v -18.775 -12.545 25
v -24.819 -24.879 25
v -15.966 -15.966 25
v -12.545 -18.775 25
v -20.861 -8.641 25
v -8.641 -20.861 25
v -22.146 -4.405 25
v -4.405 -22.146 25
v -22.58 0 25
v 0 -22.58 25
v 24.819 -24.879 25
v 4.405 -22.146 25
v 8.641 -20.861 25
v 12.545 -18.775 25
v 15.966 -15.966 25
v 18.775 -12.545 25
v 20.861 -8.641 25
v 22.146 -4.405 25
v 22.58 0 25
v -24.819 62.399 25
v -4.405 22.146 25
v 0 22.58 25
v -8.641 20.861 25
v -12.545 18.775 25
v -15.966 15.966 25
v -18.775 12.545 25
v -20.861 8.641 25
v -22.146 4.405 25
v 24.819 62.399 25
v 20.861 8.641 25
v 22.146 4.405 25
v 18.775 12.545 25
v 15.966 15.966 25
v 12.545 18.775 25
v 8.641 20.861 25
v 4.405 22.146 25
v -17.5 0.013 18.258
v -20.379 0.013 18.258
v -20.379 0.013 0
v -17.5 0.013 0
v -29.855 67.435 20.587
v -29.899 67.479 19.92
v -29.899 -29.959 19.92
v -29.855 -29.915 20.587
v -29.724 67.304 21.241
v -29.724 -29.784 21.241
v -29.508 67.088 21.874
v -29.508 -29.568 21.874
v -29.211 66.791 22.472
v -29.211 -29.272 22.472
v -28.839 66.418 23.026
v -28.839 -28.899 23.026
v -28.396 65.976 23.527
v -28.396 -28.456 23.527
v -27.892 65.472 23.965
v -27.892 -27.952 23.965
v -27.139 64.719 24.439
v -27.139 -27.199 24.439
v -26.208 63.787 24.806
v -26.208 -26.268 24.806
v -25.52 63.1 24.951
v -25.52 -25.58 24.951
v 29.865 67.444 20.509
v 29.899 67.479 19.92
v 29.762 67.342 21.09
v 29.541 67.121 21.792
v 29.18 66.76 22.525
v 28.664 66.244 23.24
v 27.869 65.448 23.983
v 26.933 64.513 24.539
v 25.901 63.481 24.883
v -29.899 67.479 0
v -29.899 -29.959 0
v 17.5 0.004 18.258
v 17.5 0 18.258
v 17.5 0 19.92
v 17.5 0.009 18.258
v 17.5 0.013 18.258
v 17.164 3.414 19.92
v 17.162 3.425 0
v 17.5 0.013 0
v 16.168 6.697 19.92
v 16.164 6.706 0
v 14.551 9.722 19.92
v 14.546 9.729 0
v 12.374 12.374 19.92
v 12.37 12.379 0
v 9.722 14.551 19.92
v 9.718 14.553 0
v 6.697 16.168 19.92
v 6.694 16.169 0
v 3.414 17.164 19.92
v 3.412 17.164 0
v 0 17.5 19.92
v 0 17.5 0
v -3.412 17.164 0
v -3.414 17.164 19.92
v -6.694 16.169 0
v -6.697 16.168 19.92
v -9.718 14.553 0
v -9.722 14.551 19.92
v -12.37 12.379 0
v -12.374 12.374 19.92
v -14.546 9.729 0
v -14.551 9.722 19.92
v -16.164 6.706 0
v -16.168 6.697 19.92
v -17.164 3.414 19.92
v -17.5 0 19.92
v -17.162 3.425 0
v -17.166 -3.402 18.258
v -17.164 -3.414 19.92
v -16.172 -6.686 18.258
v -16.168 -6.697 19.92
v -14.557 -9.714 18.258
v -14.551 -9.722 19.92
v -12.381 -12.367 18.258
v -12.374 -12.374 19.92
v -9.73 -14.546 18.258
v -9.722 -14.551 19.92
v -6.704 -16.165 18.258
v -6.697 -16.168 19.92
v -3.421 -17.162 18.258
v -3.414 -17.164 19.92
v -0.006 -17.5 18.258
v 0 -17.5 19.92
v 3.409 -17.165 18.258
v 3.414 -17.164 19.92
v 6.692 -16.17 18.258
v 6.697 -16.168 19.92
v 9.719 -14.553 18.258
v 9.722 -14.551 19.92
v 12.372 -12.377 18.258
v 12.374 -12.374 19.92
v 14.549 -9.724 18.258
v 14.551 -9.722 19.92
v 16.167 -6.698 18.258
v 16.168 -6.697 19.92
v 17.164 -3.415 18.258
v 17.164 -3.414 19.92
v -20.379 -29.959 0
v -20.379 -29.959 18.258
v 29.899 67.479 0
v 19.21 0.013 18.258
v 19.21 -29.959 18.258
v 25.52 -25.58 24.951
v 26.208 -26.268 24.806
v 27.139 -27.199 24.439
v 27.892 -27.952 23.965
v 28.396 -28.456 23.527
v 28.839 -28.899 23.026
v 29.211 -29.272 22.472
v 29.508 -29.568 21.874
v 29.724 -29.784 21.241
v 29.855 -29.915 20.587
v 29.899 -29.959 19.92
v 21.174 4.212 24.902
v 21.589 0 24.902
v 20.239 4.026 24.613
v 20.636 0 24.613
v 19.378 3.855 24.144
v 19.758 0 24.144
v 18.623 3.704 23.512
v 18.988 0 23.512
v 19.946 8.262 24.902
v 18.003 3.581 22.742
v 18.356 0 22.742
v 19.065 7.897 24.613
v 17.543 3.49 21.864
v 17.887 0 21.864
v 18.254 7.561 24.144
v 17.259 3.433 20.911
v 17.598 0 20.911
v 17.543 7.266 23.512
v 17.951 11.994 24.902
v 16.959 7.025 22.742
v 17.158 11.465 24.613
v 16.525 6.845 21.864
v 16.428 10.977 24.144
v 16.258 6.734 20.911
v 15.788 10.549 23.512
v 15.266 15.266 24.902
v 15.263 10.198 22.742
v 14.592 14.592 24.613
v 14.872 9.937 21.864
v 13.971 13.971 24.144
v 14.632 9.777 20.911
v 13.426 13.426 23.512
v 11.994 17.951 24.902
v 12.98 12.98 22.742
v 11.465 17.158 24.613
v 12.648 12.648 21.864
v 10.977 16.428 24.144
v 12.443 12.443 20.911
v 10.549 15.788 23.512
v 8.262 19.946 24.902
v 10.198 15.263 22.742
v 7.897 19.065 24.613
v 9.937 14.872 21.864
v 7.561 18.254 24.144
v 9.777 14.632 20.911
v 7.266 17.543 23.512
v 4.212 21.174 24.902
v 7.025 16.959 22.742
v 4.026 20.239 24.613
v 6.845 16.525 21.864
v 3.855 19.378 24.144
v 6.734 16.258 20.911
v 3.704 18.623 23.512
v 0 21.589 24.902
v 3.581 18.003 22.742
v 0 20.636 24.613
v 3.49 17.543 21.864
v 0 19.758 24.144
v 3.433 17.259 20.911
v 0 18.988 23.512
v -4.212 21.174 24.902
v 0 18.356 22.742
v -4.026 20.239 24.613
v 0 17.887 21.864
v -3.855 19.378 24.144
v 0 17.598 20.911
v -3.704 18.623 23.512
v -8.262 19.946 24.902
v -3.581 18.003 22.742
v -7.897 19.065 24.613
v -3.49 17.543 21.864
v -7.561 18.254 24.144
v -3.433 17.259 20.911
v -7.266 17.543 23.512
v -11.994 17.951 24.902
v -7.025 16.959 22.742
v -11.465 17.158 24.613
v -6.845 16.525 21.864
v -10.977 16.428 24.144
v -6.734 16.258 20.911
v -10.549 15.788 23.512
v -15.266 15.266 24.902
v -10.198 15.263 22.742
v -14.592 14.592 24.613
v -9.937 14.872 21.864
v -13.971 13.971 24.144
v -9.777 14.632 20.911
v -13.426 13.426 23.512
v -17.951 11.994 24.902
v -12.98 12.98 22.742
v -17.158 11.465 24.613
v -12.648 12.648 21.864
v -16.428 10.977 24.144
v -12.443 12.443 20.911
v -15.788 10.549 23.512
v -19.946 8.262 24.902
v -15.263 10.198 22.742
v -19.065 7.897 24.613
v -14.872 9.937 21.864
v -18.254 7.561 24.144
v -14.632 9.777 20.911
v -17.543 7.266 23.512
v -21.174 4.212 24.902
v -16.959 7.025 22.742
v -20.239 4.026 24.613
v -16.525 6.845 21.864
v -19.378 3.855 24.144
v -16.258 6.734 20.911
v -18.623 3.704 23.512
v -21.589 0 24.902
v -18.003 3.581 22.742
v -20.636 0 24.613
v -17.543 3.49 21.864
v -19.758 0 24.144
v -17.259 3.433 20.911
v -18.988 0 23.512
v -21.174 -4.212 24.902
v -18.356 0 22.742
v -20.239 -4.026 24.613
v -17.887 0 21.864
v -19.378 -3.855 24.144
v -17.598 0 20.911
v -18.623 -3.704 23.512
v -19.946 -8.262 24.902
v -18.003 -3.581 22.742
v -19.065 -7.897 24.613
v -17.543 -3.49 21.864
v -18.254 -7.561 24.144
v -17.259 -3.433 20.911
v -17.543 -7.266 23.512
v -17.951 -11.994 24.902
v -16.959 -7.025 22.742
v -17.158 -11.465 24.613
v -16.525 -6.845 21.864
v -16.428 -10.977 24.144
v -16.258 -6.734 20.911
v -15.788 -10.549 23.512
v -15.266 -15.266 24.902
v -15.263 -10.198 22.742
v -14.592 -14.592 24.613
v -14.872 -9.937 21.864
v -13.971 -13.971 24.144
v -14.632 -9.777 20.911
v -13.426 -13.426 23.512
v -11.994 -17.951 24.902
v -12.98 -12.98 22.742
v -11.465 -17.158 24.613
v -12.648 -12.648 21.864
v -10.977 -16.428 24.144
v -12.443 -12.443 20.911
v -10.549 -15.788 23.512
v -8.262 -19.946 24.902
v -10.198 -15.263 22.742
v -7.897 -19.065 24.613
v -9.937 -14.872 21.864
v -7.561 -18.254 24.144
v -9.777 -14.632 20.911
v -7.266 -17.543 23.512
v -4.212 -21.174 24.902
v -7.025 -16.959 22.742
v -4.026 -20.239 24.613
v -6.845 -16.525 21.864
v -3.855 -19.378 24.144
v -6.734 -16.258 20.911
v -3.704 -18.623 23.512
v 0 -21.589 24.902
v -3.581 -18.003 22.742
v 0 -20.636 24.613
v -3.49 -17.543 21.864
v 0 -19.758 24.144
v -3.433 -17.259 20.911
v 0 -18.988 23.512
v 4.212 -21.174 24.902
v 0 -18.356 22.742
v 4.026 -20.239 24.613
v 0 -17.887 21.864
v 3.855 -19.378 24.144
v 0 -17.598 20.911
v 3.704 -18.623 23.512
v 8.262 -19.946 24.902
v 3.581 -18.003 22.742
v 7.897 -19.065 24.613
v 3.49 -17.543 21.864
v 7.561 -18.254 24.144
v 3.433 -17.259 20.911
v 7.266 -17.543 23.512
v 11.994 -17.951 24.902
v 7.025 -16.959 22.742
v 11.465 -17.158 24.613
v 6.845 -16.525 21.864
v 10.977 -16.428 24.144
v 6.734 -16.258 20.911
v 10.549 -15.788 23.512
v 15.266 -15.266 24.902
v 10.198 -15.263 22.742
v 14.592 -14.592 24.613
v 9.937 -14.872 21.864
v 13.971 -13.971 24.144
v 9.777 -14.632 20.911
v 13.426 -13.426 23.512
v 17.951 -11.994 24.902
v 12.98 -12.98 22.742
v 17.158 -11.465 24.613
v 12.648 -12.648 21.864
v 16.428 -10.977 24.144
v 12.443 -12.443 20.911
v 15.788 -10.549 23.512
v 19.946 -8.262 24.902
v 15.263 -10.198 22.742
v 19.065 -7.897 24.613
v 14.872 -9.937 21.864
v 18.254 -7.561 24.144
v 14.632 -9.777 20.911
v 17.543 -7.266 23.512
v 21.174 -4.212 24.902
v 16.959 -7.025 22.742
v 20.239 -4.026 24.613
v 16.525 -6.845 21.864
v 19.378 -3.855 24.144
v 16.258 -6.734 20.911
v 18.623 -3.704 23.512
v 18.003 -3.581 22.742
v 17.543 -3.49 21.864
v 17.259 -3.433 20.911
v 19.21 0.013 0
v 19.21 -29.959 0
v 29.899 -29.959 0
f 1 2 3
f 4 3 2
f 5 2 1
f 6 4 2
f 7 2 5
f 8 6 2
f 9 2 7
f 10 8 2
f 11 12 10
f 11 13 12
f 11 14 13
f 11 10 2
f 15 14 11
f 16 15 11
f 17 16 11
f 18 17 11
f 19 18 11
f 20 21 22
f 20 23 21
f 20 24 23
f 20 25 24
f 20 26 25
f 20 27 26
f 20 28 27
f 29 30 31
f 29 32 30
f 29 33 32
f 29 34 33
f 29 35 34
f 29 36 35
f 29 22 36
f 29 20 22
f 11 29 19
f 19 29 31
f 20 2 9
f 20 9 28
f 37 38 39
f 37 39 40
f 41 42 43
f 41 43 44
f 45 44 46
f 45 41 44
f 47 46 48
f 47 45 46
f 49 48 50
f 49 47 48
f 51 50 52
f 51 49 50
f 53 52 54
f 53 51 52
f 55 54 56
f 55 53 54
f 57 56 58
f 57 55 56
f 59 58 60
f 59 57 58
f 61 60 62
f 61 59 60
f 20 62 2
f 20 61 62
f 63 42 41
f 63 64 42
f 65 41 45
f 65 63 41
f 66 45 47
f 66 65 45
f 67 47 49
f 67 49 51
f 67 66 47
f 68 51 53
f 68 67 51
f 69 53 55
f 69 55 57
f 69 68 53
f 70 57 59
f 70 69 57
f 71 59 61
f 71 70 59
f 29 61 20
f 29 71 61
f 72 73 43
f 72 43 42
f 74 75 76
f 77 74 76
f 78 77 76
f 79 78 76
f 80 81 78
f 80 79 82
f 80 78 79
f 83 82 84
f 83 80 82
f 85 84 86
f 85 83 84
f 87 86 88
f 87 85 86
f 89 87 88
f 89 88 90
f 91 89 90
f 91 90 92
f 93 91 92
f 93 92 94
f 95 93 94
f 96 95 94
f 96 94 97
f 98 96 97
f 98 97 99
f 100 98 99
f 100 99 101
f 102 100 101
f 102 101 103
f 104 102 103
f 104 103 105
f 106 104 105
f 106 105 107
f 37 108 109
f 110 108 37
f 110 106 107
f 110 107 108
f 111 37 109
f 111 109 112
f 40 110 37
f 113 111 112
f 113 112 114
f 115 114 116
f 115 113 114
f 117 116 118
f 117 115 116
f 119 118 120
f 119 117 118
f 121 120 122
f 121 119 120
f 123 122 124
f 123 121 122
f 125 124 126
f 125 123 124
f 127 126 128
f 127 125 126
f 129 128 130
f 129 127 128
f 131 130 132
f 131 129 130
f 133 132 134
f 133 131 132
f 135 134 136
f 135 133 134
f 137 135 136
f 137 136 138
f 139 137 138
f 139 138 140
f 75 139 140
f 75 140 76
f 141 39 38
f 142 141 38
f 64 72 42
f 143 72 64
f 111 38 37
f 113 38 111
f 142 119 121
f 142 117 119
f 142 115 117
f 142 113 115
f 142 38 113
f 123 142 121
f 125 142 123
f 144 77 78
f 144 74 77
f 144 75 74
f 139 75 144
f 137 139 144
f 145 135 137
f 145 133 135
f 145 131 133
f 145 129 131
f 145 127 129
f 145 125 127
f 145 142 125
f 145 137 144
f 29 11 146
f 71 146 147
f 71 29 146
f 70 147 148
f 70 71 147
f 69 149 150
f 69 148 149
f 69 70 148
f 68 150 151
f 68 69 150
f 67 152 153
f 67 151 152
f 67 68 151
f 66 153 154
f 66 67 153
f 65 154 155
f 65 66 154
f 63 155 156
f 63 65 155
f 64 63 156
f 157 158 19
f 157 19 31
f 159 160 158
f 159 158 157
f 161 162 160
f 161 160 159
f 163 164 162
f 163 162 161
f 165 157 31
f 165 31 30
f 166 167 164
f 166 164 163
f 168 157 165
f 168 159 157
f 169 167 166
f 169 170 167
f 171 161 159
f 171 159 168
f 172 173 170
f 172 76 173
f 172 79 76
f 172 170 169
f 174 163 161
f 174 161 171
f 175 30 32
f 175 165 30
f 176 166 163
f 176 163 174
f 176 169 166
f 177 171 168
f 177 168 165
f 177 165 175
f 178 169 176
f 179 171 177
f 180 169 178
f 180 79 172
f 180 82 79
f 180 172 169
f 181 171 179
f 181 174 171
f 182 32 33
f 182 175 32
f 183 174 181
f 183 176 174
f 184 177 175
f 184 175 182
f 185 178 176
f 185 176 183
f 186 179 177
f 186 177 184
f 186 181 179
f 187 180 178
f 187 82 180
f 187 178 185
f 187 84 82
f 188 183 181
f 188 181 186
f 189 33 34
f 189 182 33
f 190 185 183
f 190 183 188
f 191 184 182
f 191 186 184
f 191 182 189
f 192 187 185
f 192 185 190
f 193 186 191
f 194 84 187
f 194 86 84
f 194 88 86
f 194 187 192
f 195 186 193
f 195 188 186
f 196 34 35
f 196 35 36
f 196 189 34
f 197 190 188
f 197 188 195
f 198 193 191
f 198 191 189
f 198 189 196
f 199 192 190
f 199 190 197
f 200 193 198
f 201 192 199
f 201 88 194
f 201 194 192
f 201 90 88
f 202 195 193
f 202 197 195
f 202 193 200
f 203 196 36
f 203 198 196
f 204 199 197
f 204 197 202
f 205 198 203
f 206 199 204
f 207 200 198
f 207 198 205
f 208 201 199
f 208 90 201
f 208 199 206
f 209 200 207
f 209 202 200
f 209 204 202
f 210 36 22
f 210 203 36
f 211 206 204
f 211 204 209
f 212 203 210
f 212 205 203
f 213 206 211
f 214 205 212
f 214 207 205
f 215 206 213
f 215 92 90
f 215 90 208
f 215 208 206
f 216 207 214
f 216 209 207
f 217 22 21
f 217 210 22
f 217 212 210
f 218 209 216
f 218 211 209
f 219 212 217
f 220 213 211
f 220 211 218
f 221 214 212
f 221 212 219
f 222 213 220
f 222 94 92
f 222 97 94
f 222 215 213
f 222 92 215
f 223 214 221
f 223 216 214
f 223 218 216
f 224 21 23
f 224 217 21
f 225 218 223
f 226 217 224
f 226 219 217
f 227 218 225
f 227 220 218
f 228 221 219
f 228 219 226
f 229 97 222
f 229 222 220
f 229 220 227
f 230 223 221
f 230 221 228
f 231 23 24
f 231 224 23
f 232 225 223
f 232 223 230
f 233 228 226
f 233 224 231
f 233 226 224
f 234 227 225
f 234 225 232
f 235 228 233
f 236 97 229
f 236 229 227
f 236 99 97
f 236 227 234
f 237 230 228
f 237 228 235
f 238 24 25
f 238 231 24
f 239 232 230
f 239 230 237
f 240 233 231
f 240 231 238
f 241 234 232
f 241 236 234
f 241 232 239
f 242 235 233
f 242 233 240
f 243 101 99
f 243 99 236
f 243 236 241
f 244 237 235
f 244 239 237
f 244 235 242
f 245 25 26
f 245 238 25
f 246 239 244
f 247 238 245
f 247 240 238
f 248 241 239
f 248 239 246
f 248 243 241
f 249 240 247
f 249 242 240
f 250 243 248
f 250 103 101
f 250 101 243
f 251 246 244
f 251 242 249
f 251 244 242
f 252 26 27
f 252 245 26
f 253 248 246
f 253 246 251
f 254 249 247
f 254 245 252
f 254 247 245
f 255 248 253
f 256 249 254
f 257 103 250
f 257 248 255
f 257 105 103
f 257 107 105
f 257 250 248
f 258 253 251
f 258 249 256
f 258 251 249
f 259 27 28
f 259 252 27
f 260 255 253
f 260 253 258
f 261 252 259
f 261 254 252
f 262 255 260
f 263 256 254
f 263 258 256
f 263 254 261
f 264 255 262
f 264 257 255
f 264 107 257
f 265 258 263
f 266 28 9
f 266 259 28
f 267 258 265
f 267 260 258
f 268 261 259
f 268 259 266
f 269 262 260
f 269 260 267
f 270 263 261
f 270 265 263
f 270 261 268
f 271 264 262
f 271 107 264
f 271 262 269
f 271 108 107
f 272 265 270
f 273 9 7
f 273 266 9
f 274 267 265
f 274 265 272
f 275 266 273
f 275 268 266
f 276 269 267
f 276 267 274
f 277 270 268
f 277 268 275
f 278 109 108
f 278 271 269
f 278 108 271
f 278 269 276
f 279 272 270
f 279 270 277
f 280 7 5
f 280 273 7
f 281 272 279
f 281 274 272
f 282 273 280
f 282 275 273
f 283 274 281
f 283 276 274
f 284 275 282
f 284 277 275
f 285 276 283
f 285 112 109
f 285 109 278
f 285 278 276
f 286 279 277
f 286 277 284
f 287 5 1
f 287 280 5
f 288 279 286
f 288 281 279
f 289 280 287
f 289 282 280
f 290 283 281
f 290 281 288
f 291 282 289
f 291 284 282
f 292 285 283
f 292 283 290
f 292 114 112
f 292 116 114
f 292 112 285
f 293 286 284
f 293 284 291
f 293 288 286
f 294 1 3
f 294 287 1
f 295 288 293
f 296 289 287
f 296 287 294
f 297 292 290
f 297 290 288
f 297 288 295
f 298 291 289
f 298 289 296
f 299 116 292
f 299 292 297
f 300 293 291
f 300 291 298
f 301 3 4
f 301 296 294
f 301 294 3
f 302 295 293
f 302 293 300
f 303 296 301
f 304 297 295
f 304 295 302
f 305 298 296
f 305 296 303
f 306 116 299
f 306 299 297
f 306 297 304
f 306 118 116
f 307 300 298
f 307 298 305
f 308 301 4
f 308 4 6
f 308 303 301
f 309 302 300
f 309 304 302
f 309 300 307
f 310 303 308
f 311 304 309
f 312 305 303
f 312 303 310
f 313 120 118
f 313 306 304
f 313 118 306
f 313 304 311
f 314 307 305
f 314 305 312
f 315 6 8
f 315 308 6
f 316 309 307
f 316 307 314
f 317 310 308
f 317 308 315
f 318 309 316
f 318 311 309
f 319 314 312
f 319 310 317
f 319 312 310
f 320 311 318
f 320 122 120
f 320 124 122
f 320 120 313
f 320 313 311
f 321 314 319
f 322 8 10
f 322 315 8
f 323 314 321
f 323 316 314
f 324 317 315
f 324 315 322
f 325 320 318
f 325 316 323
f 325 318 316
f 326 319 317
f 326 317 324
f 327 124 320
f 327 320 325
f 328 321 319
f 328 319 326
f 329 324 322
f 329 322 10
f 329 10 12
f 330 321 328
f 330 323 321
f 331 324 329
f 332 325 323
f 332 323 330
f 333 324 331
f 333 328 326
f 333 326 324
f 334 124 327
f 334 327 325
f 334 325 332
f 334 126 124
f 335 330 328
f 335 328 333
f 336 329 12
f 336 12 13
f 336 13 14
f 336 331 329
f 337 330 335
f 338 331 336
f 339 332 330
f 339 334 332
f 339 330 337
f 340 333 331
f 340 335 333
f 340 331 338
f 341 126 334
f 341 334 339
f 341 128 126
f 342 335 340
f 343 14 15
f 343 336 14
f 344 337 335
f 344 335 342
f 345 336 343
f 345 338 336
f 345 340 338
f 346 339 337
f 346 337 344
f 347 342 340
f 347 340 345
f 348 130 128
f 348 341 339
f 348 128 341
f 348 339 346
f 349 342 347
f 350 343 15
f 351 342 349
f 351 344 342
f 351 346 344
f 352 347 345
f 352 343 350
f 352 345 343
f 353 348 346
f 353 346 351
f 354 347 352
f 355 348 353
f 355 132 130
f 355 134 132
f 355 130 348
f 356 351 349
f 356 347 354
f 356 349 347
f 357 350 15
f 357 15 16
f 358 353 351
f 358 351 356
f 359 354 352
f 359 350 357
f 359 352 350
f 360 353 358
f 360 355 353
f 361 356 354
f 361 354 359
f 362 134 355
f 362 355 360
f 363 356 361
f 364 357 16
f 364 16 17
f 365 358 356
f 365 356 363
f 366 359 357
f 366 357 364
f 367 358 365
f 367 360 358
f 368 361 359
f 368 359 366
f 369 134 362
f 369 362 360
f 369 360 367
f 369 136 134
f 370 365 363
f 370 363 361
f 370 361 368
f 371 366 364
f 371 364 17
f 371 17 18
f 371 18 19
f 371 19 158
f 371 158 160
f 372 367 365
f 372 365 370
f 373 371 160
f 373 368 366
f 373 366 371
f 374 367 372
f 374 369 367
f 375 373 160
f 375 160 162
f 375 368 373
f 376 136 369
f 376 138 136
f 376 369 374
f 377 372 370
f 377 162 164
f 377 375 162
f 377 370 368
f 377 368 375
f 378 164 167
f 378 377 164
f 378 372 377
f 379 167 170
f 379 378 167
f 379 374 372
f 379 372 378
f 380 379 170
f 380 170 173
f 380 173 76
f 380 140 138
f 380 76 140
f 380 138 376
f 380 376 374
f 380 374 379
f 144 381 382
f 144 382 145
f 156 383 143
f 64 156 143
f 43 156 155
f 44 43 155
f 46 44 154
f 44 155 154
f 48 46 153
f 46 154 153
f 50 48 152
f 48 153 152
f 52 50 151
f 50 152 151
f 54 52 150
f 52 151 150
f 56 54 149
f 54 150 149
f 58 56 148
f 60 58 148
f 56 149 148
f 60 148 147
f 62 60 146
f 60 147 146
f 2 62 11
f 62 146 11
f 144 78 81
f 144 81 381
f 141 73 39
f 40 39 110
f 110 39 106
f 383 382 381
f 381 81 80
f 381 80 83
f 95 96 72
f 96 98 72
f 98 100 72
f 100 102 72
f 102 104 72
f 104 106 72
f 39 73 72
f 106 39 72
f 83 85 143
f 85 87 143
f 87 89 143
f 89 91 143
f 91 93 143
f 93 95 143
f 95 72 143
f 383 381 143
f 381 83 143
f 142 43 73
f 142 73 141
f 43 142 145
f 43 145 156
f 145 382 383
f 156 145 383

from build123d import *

# Parameters (mm, degrees)
F1_W     = 59.7976446152
F1_H     = 97.4377058446
F1_R     = 17.5
F2_DEPTH = 25
F3_W     = 39.5896174014
F3_H     = 18.2575397193
F4_DEPTH = 29.972
F5_R     = 5.08


with BuildPart() as f2:
    # F1 (on face) → F2 (new body)
    with BuildSketch(Plane.XY):
        with Locations((0, 18.7598057091)):
            Rectangle(F1_W, F1_H)
        Circle(F1_R, mode=Mode.SUBTRACT)
    extrude(amount=F2_DEPTH)

    # F3 (on face) → F4 (cut)
    with BuildSketch(Plane.XZ.offset(29.9590472132)):
        with Locations((-0.5845595151, 9.1287698597)):
            Rectangle(F3_W, F3_H)
    extrude(amount=-F4_DEPTH, mode=Mode.SUBTRACT)

    # F5
    f5_edges = [f2.edges().sort_by_distance(p)[0] for p in [
        (0, -29.959047, 25),
        (29.898822, 18.759806, 25),
        (0, 67.478659, 25),
        (-29.898822, 18.759806, 25),
        (-17.5, 0, 25),
    ]]
    fillet(f5_edges, radius=F5_R)


solid = f2.part
